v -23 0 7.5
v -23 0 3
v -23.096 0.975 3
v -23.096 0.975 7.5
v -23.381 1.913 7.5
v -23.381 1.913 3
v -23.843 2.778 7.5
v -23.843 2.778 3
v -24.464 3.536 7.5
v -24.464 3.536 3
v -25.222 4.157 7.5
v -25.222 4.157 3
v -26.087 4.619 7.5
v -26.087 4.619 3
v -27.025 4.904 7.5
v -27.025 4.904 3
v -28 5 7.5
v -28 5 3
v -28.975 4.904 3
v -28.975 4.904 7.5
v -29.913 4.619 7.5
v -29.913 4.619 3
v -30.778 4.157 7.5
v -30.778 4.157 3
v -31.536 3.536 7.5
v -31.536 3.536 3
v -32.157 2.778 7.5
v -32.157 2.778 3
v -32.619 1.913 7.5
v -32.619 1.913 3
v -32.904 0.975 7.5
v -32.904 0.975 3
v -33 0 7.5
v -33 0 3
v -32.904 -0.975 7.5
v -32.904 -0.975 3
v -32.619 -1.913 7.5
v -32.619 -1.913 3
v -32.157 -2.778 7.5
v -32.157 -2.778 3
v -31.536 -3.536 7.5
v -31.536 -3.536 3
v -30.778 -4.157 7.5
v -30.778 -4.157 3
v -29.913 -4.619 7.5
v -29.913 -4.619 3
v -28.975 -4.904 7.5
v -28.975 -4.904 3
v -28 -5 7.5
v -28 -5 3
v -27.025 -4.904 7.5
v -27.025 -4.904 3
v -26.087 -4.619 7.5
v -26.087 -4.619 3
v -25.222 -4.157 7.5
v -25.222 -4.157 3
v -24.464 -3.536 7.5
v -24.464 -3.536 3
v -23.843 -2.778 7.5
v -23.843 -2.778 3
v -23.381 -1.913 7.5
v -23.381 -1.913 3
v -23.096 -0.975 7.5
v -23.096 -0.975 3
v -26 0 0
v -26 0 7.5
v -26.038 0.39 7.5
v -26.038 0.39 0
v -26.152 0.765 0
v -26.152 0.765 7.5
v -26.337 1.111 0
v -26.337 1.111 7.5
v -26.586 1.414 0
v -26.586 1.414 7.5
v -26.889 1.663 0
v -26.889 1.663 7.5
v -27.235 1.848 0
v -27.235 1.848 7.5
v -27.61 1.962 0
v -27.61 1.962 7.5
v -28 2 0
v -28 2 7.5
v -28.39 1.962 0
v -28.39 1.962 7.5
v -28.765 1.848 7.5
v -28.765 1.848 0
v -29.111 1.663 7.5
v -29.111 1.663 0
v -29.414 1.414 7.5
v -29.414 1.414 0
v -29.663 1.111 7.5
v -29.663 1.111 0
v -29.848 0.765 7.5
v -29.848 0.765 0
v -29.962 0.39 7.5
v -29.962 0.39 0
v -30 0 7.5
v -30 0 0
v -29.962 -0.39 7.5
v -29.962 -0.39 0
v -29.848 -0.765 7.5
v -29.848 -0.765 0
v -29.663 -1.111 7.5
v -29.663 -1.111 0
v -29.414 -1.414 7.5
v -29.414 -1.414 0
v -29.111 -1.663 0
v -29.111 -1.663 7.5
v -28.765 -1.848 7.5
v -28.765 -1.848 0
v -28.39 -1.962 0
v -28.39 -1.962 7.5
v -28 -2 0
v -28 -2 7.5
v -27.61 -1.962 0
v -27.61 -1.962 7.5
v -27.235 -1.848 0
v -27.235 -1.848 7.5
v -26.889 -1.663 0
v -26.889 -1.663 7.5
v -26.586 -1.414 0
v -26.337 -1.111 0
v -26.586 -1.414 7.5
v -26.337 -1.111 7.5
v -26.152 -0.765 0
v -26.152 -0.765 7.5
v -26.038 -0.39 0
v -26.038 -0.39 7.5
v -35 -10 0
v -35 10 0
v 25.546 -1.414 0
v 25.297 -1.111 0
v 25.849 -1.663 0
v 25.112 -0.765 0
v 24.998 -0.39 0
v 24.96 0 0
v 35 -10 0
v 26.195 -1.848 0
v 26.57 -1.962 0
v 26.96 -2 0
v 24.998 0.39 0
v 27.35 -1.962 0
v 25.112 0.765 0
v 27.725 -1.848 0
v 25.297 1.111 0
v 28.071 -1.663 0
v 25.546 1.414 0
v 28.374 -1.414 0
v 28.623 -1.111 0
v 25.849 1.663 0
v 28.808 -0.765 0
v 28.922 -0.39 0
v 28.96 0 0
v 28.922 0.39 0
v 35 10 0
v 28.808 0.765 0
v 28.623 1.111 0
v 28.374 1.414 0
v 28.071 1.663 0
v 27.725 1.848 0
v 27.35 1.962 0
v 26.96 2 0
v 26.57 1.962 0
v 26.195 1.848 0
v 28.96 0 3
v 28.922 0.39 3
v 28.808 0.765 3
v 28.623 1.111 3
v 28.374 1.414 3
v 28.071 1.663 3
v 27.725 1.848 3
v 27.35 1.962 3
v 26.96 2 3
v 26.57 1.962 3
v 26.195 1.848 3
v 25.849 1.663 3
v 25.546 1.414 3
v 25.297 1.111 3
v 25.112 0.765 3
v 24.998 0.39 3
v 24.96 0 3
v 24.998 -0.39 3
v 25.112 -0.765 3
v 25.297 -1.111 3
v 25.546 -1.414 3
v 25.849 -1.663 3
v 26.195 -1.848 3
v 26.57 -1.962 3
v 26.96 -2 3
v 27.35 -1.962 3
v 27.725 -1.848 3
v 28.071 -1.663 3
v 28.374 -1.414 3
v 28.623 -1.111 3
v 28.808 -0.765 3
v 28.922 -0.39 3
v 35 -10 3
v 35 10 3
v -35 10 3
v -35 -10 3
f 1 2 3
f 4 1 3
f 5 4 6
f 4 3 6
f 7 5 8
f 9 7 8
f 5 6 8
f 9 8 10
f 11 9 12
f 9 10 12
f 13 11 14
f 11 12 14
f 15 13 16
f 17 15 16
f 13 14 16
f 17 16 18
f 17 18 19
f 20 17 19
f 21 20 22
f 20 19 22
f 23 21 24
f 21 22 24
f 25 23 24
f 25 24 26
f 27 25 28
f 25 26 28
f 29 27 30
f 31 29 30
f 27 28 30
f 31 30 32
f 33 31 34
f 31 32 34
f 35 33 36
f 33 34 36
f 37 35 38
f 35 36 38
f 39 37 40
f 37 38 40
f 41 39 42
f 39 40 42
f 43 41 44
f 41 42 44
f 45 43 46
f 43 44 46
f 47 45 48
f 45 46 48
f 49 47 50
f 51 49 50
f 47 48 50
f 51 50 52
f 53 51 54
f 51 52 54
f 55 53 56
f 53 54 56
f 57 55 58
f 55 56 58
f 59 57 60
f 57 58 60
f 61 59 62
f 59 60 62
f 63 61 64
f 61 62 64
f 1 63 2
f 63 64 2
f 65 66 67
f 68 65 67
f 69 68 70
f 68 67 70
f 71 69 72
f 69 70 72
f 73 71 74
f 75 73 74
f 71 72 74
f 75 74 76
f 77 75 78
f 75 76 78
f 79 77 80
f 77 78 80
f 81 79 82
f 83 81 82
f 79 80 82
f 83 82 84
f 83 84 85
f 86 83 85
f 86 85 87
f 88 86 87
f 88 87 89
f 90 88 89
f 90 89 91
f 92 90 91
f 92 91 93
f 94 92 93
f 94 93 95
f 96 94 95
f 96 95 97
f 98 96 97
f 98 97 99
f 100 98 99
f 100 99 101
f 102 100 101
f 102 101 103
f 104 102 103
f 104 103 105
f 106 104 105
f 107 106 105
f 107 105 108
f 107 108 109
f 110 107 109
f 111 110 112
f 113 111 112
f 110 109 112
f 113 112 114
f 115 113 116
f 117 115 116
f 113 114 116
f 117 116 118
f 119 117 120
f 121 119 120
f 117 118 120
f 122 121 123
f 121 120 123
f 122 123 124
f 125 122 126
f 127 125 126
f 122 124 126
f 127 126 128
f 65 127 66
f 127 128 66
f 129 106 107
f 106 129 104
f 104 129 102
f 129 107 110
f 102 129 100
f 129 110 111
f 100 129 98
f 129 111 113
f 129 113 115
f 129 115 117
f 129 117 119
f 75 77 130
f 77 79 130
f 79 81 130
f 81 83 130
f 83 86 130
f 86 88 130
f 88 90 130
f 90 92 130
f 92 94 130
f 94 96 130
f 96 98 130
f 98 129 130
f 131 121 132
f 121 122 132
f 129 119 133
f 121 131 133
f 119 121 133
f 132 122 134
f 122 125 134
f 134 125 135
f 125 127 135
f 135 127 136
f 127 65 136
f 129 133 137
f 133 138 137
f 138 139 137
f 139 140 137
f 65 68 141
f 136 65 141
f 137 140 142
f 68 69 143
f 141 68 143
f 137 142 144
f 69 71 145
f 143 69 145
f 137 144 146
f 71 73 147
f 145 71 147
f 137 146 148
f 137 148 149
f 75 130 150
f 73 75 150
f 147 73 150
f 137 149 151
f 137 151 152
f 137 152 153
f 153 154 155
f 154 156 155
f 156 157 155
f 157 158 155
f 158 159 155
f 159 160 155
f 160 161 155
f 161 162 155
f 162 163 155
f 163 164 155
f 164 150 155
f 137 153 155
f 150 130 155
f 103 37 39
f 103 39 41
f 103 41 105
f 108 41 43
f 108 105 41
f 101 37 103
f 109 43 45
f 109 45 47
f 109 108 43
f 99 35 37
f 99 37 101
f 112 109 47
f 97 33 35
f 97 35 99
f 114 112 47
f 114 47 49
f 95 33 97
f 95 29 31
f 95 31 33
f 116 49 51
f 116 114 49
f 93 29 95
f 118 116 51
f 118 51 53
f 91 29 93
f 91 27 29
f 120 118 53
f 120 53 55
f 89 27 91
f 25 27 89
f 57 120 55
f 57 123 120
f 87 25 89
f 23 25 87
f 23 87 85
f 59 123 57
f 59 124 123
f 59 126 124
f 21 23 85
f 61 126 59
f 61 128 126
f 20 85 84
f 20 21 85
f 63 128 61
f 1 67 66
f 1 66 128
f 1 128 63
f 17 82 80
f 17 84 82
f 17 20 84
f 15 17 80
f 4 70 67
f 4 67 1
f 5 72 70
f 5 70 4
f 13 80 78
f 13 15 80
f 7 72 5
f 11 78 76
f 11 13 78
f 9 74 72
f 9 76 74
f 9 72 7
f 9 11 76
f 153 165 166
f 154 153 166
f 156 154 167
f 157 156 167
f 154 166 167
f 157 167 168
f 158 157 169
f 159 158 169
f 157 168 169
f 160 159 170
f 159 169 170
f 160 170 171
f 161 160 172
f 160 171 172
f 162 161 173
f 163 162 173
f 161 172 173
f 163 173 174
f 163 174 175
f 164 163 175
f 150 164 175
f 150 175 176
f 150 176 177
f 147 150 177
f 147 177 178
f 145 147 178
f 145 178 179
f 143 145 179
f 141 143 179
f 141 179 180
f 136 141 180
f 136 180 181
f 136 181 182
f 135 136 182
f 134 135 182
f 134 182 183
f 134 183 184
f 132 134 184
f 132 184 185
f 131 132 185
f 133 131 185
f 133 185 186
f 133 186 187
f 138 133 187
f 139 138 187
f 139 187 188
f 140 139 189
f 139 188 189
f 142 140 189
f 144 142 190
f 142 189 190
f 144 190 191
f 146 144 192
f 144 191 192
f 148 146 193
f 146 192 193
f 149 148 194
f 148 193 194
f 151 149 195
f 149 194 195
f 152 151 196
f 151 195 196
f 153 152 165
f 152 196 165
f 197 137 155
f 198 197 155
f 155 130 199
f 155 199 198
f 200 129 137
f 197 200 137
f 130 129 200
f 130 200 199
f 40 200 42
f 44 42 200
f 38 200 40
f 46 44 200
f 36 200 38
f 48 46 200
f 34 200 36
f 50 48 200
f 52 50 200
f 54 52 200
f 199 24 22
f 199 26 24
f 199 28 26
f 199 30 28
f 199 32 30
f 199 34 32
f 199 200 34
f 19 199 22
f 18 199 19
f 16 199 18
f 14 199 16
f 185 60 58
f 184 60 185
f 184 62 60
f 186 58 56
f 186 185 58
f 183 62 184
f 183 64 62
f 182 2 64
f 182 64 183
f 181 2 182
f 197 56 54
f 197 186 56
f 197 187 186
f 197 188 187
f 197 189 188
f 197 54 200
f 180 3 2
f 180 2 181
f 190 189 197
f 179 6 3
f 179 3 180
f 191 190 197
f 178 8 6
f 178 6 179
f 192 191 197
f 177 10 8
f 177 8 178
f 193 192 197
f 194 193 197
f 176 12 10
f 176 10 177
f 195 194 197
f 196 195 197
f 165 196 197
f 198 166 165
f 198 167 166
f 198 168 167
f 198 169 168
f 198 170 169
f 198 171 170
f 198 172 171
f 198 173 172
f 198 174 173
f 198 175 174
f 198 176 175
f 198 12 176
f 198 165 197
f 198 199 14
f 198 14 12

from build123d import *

# Parameters (mm, degrees)
SKETCH1_W           = 70
SKETCH1_H           = 20
BOSS_EXTRUDE1_DEPTH = 3
SKETCH2_R           = 2
CUT_EXTRUDE2_DEPTH  = 37.523964735
SKETCH3_R           = 5
BOSS_EXTRUDE2_DEPTH = 4.5
SKETCH4_R           = 2
CUT_EXTRUDE3_DEPTH  = 4.5


with BuildPart() as part:
    # Sketch1 → Boss-Extrude1 (new body)
    with BuildSketch(Plane.XY):
        Rectangle(SKETCH1_W, SKETCH1_H)
    extrude(amount=BOSS_EXTRUDE1_DEPTH)

    # Sketch2 → Cut-Extrude2 (cut, through all)
    with BuildSketch(Plane.XY.offset(3)):
        with Locations((-28, 0)):
            Circle(SKETCH2_R)
        with Locations((26.96, 0)):
            Circle(SKETCH2_R)
    extrude(amount=-CUT_EXTRUDE2_DEPTH, mode=Mode.SUBTRACT)

    # Sketch3 → Boss-Extrude2 (add)
    with BuildSketch(Plane.XY.offset(3)):
        with Locations((-28, 0)):
            Circle(SKETCH3_R)
    extrude(amount=BOSS_EXTRUDE2_DEPTH)

    # Sketch4 → Cut-Extrude3 (cut)
    with BuildSketch(Plane.XY.offset(7.5)):
        with Locations((-28, 0)):
            Circle(SKETCH4_R)
    extrude(amount=-CUT_EXTRUDE3_DEPTH, mode=Mode.SUBTRACT)


solid = part.part
